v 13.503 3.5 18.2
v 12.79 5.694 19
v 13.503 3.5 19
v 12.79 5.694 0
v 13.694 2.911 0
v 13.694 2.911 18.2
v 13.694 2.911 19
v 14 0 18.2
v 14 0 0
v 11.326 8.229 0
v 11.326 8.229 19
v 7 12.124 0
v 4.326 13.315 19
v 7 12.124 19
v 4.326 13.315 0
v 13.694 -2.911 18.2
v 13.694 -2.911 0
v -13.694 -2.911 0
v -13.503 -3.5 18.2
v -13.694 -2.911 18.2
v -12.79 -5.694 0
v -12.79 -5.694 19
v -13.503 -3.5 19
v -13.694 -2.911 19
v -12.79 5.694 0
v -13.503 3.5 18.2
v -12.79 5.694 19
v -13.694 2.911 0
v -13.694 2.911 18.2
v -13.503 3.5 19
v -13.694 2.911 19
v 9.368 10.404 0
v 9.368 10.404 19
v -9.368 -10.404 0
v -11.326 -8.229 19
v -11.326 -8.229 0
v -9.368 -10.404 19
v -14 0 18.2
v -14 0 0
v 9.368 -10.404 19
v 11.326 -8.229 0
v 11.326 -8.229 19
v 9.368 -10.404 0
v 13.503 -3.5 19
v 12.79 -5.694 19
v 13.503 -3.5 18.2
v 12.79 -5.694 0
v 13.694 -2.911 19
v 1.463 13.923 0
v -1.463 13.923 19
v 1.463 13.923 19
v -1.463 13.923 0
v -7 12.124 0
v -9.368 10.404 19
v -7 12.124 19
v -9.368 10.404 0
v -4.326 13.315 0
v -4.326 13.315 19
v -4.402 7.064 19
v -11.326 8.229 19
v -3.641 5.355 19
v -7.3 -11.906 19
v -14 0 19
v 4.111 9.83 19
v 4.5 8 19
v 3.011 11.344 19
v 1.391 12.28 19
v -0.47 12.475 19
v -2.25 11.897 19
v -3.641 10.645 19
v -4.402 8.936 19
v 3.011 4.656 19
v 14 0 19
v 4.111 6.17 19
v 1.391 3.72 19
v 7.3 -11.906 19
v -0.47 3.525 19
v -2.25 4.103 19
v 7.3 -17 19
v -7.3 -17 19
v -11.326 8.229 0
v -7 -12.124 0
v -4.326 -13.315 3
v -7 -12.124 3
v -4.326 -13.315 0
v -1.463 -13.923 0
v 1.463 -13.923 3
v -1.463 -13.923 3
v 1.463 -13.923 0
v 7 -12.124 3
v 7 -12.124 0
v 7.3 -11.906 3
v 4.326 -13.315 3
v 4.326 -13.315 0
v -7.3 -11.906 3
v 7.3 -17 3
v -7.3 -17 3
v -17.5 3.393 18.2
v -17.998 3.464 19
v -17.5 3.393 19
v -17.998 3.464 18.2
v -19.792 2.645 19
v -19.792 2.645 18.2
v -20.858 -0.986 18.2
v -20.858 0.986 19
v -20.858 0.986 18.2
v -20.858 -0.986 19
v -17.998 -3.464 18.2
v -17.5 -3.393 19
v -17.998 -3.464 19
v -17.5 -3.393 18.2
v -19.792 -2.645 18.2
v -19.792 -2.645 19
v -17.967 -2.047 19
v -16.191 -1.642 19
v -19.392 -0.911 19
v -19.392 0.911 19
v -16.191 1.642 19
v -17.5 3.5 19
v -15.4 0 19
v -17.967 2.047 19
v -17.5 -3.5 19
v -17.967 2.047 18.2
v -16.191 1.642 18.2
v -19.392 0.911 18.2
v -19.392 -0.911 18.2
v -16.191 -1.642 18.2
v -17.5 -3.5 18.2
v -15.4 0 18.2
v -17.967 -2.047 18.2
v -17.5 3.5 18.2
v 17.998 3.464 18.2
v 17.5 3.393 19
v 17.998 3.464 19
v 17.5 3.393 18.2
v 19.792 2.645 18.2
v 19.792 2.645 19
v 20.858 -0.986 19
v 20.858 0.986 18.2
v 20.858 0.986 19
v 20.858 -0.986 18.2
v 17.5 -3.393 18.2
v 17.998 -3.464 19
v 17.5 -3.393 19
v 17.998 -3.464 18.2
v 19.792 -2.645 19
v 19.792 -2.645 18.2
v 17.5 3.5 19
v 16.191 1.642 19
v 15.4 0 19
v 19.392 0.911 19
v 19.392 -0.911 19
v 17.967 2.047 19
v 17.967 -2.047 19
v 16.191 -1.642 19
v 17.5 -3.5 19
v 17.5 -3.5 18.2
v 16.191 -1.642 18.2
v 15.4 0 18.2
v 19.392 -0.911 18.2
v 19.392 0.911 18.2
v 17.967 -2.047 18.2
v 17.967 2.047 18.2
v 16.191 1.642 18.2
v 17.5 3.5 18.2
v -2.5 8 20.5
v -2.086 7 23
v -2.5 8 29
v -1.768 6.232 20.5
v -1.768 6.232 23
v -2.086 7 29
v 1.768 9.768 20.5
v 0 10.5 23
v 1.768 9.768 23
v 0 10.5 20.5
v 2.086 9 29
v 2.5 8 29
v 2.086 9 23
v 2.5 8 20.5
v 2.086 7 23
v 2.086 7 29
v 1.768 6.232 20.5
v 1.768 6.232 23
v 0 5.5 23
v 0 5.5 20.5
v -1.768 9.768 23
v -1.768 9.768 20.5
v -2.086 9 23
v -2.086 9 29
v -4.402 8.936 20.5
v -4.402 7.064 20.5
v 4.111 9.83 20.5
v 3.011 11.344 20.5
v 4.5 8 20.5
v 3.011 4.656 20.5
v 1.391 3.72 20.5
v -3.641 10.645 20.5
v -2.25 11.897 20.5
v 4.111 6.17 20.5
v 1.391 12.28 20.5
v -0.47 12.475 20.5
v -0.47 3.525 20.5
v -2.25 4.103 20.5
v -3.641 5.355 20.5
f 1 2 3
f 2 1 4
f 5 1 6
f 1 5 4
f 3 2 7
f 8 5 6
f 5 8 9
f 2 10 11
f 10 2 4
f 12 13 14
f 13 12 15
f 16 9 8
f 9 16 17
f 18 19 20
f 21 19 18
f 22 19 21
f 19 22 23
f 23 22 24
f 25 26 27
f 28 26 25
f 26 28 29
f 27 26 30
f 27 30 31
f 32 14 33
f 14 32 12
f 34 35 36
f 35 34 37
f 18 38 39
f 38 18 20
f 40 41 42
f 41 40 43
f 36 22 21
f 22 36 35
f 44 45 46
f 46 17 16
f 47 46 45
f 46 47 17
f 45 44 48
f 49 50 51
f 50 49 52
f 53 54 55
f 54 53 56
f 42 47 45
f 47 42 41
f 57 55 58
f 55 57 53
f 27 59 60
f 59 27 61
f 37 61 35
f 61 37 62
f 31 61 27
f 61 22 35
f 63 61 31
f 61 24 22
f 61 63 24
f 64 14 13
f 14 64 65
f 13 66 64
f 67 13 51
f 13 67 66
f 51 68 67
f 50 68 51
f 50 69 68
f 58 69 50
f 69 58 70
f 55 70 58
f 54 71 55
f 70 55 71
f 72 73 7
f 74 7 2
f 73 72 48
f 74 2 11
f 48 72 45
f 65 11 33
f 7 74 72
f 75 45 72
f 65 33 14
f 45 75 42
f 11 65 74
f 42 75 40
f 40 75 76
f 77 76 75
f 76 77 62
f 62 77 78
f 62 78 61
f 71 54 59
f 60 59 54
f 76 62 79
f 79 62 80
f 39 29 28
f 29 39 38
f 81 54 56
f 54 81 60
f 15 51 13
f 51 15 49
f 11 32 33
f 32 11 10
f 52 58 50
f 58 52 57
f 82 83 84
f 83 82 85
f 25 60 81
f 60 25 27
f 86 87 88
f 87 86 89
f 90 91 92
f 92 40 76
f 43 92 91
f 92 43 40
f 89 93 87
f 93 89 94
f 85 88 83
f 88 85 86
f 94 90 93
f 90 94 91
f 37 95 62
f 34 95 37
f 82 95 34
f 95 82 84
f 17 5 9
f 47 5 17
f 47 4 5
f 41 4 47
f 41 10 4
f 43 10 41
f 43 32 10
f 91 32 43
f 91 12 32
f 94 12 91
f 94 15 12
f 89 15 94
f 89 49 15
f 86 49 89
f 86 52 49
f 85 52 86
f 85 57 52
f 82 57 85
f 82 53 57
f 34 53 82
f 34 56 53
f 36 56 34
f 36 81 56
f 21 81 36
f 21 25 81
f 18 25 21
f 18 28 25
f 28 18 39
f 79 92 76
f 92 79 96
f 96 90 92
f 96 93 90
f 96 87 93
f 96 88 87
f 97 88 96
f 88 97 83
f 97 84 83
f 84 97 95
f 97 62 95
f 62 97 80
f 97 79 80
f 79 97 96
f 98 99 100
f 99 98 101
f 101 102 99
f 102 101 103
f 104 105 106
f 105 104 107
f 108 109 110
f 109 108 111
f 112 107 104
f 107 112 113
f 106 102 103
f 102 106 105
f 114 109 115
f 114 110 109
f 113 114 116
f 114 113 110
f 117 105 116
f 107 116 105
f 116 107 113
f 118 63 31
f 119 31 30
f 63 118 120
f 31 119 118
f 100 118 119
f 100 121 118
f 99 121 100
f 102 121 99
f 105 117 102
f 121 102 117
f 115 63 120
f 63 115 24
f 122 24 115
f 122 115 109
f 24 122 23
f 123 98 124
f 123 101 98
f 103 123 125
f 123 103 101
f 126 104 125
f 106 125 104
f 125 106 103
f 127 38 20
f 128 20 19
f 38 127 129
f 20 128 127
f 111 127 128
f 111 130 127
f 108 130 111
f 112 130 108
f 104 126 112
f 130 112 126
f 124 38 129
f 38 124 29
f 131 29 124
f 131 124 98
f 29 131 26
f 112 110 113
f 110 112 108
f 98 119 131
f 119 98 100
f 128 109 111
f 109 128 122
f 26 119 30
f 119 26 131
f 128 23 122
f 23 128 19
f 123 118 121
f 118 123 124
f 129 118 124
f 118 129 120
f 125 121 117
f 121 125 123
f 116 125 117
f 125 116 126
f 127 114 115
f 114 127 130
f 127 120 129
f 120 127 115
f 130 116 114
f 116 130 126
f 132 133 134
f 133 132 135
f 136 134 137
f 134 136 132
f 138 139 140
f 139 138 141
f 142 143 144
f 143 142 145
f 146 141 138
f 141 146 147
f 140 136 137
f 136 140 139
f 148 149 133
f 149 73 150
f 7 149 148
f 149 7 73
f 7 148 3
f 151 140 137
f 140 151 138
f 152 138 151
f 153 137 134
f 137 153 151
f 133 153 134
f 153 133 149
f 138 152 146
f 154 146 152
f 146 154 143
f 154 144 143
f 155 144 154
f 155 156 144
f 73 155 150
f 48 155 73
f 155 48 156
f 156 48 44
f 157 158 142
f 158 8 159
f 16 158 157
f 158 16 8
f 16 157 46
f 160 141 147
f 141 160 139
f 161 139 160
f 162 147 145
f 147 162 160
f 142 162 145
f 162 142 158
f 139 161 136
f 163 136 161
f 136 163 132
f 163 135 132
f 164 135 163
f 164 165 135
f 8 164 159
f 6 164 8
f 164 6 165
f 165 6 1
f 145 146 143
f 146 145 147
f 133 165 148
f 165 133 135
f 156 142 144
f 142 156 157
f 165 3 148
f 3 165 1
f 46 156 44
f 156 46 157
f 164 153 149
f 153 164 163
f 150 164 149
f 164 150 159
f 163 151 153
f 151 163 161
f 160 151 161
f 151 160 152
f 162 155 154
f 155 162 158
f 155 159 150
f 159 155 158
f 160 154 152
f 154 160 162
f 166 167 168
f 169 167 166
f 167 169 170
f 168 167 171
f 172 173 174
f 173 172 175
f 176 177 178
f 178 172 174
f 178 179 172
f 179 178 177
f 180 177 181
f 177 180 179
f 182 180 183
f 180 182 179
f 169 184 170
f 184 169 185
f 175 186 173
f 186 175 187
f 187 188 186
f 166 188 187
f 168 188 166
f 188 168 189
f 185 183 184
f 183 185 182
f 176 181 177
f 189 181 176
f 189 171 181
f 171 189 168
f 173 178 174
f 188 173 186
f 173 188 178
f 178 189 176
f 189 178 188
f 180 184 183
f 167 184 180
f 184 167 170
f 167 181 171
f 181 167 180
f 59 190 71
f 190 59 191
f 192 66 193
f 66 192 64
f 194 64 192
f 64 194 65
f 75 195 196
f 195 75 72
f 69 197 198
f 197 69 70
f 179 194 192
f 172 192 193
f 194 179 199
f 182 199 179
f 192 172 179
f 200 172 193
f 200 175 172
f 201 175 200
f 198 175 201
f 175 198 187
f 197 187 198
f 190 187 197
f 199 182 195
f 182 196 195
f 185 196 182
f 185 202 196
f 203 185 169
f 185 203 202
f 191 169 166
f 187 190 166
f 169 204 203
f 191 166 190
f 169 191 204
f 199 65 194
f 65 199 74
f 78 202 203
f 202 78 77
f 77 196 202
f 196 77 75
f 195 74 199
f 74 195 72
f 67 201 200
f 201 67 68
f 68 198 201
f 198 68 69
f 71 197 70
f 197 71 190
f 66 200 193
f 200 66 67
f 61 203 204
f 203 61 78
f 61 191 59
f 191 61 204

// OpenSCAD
module body()
{
    union()
    {
        cylinder(h = 19, d = 28, center = [0,0,0]);
        translate([-14.6/2,-17,19-16]) cube([14.6,17,16]);
    }
}

module ear()
{
    translate([-35/2,0,19-0.8/2])
    {
        difference()
        {
            union()
            {
                cylinder(h=0.8, d=7, center=true);
                translate([0,-7/2,-0.8/2])
                {
                    cube([7,7,0.8]);
                }
            }
            cylinder(h=0.8+0.1, d=4.2, center=true);
        }
    }
}

module axis()
{
    translate([0,8,19])
    {
        cylinder(h=1.5, d=9);
        difference()
        {
            cylinder(h=10, d=5);
            translate([-3,(+5-3)/2,4]) cube([3*2,2,7]);
            translate([-3,(-5+3)/2-2,4]) cube([3*2,2,7]);
        }
    }
}

module stepper_28BYJ_48()
{
    color("darkgreen") body();
    color("lightgreen")
    {
        ear();
        mirror(v=[-1,0,0]) ear();
    }
    color("lightgreen") axis();
}

stepper_28BYJ_48();
